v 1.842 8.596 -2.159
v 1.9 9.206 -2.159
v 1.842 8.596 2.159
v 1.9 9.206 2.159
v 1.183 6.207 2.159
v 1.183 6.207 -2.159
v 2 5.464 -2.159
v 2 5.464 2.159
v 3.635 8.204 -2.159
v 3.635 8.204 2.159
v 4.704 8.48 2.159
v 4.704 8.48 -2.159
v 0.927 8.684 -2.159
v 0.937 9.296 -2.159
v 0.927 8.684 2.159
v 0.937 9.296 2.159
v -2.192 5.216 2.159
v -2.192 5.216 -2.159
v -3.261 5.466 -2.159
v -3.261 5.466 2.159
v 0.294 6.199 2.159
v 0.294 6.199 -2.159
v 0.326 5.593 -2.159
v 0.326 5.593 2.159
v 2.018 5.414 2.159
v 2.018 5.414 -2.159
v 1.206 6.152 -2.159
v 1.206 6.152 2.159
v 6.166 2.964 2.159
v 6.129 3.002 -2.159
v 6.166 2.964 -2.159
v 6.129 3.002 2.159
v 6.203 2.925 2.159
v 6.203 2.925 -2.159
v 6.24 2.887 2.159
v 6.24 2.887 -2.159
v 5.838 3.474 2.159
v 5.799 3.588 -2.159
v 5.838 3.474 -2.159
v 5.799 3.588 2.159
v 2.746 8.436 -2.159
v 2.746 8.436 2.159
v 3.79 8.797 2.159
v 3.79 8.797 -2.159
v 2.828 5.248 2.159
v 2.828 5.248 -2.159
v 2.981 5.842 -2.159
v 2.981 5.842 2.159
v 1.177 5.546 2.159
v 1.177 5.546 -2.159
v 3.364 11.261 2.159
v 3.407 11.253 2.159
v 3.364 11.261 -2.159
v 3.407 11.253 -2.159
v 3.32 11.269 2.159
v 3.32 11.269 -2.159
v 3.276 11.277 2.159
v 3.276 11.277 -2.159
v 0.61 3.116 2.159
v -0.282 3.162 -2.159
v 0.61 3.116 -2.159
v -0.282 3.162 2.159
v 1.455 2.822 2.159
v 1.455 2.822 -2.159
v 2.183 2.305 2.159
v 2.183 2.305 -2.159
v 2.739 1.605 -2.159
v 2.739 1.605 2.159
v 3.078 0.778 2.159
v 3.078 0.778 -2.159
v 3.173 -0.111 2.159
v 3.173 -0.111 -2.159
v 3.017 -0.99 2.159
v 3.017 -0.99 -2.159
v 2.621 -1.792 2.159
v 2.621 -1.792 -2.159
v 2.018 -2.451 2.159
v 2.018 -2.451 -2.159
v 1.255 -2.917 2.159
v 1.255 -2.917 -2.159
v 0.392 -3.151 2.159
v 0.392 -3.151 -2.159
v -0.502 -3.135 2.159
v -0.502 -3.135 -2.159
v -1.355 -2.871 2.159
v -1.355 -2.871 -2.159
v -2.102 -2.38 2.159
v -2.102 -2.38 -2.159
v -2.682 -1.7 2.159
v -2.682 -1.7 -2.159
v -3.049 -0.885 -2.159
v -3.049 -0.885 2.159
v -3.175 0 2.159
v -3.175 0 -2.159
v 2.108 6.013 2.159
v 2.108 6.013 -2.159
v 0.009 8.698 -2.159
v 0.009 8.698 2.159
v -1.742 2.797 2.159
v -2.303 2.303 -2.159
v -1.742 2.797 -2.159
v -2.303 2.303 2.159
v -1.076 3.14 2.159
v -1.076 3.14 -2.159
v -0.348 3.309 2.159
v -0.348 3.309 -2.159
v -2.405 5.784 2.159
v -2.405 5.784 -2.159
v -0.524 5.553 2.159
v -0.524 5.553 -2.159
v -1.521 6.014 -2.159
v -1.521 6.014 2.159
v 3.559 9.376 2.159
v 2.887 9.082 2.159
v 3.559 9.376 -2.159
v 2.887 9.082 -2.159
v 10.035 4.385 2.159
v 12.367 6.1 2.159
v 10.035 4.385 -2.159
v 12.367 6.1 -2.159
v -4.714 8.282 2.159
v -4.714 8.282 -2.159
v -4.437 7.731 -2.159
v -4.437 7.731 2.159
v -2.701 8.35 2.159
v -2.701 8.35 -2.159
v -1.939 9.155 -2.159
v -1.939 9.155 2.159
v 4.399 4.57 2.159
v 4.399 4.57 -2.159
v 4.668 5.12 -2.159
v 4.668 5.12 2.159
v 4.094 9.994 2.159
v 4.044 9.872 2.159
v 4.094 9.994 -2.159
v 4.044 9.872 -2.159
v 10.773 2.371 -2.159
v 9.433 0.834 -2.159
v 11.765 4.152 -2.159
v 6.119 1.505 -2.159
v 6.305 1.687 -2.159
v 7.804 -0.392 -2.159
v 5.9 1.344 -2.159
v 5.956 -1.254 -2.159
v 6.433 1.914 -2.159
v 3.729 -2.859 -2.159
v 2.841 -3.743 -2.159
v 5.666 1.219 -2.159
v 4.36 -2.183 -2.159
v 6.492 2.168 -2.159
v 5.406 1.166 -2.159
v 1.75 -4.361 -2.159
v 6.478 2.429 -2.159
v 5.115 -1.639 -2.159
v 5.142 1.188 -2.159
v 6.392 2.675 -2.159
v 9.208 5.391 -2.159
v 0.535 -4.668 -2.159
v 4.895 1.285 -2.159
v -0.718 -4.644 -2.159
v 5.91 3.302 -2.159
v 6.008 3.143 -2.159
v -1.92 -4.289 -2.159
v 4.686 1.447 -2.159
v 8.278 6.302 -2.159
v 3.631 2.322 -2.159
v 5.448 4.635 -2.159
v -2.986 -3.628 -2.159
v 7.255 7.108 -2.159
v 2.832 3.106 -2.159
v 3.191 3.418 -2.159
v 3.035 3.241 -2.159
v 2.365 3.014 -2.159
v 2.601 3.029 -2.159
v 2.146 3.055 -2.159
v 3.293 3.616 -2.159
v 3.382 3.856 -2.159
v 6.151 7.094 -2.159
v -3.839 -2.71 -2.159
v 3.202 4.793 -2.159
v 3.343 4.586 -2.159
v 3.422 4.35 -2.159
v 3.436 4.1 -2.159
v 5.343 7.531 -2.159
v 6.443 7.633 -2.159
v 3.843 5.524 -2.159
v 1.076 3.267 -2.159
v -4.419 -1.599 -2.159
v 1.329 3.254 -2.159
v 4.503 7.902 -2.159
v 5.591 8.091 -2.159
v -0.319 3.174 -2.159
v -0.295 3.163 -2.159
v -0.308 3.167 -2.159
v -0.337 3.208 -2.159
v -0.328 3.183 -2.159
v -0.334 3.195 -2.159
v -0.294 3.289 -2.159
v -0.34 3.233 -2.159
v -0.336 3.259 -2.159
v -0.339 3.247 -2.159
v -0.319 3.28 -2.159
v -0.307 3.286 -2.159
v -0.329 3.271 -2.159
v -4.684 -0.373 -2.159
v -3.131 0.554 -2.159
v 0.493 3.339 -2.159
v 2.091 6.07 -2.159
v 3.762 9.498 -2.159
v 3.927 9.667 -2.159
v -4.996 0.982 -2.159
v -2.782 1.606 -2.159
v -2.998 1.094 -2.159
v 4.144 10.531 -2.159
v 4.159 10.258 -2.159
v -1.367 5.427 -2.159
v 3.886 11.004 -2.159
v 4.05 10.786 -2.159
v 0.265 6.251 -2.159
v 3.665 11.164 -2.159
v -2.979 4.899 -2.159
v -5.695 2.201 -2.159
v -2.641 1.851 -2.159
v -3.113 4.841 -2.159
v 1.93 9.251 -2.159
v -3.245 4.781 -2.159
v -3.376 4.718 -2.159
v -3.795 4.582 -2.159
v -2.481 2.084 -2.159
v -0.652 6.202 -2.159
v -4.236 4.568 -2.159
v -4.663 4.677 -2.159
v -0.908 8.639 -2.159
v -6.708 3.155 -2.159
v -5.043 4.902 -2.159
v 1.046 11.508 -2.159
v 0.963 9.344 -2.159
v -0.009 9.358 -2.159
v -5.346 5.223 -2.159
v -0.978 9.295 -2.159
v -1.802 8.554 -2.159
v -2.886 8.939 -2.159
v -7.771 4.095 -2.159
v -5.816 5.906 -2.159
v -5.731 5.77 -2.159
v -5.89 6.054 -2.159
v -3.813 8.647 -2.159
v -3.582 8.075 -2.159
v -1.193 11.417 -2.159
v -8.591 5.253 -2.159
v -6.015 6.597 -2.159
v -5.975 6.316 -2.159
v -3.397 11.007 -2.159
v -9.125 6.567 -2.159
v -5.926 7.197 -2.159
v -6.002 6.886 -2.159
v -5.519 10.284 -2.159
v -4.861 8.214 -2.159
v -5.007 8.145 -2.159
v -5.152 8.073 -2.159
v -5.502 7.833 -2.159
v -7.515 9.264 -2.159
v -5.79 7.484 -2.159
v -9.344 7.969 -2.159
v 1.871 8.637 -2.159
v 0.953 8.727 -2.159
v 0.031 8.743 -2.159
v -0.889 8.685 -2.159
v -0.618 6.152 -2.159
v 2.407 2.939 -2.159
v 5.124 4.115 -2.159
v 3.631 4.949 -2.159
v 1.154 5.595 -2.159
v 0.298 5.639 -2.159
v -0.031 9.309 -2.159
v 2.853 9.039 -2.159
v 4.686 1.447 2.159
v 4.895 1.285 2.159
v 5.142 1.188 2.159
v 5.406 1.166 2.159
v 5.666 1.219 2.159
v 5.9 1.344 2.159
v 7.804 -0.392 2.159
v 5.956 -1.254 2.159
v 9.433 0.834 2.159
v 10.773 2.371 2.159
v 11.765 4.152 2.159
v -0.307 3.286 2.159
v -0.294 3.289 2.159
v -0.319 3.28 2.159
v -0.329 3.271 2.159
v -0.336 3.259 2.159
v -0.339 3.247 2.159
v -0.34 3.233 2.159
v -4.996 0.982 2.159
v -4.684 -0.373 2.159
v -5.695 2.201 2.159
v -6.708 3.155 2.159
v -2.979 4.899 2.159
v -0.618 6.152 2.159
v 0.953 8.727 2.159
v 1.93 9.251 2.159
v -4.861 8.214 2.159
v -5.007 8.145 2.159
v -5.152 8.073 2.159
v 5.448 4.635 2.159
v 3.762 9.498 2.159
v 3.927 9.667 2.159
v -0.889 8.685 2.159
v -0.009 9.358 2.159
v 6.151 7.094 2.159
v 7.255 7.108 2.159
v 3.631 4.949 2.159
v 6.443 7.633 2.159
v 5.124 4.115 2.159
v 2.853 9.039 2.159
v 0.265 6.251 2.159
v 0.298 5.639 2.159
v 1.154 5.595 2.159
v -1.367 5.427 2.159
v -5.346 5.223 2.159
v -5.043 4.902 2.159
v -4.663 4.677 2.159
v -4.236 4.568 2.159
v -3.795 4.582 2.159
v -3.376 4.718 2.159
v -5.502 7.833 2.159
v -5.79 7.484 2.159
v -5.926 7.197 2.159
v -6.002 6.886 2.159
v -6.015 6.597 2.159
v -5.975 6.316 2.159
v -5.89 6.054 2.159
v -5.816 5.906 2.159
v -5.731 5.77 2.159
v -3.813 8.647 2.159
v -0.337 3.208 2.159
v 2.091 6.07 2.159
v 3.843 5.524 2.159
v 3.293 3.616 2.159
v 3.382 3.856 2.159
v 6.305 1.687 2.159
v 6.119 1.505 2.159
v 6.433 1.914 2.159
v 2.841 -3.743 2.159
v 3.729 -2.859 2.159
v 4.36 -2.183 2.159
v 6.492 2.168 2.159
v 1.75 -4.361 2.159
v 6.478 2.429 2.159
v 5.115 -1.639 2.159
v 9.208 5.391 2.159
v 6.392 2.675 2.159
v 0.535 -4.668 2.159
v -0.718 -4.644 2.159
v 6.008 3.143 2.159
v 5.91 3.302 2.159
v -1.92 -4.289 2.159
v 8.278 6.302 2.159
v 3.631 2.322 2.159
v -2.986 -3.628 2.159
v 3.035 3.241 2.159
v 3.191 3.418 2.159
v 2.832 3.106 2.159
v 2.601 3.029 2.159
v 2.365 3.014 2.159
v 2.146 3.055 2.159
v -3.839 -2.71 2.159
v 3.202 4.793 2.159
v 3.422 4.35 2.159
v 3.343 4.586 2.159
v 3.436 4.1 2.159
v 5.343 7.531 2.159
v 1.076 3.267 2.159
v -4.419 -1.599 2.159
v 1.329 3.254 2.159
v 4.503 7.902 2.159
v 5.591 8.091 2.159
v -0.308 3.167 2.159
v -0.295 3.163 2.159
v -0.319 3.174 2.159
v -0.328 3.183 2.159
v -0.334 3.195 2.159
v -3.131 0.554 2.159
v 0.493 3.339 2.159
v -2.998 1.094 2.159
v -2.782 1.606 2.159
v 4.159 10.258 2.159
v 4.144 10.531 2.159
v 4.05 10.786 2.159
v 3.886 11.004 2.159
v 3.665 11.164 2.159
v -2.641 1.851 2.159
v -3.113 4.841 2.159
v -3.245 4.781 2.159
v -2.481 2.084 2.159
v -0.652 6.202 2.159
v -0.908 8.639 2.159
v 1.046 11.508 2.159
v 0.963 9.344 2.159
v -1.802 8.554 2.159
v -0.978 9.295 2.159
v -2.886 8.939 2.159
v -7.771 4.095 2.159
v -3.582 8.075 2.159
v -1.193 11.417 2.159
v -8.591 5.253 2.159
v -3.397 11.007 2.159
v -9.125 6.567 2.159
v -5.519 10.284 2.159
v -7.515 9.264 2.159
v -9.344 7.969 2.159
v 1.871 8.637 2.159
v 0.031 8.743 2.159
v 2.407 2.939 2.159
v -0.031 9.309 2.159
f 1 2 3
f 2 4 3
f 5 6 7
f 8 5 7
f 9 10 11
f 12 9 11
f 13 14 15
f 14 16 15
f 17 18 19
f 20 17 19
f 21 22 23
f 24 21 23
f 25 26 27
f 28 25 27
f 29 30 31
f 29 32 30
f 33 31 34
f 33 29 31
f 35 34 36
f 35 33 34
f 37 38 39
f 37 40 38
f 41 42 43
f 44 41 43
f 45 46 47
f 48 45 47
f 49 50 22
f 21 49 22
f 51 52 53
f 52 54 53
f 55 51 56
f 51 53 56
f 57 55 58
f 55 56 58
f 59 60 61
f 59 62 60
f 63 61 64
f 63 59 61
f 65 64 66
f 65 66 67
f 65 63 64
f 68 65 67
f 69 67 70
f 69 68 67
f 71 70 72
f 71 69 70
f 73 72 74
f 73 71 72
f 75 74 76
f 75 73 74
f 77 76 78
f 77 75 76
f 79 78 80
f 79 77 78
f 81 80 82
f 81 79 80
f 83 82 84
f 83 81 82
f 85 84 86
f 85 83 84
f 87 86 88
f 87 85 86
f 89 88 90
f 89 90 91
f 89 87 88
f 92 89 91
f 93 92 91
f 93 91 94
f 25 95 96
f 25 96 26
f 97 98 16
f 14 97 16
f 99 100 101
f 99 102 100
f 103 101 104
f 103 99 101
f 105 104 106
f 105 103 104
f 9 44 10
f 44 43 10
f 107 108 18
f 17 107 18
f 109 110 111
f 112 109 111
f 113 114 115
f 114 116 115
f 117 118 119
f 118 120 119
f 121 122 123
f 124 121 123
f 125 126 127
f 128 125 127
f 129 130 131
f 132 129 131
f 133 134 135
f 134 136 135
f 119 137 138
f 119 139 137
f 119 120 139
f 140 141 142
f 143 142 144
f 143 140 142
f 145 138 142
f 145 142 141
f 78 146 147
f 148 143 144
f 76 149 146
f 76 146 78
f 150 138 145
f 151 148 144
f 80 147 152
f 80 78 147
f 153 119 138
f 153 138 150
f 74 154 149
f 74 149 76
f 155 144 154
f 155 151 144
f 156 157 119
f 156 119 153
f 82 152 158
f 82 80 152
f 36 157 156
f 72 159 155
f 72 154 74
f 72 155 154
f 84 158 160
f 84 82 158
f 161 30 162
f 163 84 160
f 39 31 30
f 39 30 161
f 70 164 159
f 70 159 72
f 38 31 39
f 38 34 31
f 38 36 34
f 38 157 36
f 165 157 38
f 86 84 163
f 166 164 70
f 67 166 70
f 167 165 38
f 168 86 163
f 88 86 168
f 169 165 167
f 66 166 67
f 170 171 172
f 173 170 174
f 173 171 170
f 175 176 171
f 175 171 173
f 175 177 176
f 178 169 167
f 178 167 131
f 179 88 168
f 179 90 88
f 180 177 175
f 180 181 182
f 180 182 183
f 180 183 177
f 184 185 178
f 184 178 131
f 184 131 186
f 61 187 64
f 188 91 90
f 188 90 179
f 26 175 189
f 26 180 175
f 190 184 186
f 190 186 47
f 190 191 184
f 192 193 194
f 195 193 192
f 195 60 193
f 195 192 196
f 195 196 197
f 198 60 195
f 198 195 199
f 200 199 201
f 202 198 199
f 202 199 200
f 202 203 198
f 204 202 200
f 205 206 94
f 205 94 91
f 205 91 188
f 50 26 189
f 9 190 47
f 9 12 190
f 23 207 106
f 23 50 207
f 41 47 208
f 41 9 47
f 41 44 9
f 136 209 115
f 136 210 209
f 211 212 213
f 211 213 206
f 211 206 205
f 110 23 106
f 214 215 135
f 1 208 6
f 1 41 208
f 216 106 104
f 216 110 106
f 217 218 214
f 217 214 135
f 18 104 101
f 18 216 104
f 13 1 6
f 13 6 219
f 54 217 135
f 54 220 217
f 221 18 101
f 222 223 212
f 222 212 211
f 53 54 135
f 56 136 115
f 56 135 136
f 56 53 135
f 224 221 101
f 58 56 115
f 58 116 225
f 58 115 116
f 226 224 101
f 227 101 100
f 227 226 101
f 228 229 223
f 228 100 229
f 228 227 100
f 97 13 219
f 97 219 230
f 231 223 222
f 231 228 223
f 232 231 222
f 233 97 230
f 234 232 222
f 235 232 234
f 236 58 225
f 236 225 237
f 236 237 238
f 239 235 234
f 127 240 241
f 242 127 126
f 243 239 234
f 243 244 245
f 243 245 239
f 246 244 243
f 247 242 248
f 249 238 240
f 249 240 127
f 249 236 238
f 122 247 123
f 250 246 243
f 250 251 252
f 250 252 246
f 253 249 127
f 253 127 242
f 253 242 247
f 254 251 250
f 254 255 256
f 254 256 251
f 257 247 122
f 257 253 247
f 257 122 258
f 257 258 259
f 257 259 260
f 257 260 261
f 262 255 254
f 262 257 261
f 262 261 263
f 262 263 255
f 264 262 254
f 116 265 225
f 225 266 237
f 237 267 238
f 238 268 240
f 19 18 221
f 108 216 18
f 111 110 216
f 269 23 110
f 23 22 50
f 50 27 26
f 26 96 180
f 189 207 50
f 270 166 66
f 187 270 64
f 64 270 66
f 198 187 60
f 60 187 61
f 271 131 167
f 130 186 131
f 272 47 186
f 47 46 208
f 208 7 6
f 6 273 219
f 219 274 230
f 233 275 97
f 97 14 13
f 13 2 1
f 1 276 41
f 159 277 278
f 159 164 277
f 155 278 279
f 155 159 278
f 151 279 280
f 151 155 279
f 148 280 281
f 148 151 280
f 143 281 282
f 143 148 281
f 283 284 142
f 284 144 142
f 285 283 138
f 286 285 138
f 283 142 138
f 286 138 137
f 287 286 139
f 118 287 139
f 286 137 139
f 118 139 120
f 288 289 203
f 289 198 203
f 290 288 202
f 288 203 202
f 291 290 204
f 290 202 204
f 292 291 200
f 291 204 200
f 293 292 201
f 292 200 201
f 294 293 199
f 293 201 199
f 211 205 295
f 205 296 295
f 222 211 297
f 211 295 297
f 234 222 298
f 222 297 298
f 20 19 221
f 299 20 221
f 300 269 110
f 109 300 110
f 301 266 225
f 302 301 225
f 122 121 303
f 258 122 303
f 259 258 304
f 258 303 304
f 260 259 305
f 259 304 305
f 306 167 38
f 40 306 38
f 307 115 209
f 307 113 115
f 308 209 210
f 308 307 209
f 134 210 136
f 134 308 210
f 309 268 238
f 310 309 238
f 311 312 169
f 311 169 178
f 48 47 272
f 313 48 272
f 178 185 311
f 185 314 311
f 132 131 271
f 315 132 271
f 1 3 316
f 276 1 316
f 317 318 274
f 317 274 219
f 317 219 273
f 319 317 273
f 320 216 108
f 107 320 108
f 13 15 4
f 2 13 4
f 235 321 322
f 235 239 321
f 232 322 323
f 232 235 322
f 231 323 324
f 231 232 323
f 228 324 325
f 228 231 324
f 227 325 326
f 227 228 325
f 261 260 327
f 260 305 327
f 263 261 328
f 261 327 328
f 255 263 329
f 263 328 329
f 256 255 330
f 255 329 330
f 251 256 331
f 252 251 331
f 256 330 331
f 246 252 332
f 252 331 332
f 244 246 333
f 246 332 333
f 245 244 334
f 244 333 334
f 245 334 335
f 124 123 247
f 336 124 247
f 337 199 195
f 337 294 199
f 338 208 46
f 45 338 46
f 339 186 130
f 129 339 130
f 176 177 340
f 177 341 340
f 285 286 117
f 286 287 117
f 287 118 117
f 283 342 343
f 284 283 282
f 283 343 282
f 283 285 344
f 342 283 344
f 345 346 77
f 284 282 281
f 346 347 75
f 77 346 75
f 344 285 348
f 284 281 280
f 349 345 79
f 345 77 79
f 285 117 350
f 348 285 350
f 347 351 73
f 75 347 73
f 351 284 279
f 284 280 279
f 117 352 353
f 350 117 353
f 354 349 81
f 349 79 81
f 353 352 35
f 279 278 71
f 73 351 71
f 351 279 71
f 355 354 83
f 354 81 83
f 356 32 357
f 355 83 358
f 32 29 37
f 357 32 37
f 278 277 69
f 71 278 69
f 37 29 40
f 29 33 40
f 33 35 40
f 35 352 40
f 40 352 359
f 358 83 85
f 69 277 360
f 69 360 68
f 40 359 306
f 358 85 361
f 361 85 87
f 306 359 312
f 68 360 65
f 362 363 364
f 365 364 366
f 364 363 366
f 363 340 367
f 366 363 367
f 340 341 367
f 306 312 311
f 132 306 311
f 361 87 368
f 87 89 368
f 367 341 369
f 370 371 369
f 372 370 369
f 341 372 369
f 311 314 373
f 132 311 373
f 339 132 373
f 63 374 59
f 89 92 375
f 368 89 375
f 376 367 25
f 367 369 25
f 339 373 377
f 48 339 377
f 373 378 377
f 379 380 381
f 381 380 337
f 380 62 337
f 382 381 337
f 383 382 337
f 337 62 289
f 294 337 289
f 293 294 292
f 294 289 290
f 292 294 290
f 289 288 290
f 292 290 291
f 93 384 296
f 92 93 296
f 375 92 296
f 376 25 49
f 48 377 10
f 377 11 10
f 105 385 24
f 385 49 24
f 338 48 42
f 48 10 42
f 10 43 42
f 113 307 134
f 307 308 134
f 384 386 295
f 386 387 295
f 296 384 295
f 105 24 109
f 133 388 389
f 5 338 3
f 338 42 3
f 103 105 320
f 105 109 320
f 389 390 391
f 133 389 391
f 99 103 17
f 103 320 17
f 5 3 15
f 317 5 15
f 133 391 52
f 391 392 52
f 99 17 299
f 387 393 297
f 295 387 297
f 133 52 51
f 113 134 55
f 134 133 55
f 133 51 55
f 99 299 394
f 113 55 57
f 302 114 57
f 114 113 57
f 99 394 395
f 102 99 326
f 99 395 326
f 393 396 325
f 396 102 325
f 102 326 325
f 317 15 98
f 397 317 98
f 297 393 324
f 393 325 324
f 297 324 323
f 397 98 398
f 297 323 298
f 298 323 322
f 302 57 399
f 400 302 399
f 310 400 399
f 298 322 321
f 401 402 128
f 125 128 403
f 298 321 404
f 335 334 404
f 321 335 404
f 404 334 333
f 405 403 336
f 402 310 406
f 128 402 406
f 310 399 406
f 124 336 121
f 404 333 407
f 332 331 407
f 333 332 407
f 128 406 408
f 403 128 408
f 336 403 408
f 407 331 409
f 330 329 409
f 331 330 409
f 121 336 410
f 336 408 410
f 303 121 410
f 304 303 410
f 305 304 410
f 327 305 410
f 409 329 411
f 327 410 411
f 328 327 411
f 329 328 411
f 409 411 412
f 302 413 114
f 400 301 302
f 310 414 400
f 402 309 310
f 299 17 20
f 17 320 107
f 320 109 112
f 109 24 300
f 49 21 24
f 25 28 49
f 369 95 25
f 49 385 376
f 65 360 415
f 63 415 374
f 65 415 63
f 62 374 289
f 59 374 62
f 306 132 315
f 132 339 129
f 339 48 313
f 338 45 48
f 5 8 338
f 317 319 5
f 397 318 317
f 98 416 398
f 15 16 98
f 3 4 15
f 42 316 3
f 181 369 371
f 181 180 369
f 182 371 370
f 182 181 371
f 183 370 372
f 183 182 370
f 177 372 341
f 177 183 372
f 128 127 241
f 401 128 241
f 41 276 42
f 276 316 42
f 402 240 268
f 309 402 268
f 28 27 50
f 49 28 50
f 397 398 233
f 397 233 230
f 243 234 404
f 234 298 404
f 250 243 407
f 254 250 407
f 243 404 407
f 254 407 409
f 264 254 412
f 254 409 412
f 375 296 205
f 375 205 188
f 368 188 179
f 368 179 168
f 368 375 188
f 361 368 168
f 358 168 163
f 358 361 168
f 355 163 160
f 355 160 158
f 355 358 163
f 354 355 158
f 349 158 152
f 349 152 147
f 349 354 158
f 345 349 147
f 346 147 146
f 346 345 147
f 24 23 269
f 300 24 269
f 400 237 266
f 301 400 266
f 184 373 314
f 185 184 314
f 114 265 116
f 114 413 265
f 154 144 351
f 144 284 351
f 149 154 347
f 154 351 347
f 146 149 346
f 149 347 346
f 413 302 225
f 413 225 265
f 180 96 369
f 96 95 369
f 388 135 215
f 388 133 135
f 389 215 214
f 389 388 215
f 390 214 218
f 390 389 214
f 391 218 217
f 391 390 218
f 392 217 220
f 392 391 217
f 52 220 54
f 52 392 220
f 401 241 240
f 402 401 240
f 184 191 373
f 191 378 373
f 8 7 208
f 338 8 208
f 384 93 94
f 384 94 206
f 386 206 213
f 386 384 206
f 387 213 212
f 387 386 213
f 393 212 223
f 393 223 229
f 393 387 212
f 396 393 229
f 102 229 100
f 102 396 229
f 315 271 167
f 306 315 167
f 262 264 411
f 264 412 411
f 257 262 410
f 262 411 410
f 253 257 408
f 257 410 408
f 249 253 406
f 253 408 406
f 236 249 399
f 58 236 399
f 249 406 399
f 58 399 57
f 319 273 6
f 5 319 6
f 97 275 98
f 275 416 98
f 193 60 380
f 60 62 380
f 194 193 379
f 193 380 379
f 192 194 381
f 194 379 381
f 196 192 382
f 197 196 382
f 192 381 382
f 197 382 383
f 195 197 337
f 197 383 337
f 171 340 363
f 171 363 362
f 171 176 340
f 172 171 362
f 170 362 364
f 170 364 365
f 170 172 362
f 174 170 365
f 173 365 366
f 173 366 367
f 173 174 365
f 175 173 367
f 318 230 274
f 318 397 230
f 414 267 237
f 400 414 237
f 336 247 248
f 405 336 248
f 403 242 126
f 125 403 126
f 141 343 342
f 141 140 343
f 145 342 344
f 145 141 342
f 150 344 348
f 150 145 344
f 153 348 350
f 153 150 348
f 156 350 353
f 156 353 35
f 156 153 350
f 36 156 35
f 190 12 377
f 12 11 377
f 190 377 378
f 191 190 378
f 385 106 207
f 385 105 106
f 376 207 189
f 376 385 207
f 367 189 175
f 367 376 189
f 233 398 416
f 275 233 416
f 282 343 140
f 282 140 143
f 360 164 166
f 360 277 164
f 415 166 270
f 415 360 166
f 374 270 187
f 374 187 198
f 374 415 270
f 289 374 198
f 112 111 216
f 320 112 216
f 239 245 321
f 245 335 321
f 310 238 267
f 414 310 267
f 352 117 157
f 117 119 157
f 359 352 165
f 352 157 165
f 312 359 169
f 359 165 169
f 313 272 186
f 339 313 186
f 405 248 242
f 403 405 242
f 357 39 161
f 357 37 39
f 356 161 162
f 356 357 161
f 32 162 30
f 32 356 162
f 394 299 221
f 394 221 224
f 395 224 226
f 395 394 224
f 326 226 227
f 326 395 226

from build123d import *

# Parameters (mm, degrees)
BOSS_EXTRUDE1_DEPTH  = 2.159
BOSS_EXTRUDE2_DEPTH  = 2.159
CRVPATTERN14_START   = -2.159
CRVPATTERN14_DEPTH   = 4.318
BOSS_EXTRUDE3_DEPTH  = 2.159
BOSS_EXTRUDE12_START = -2.159
BOSS_EXTRUDE12_DEPTH = 4.318
BOSS_EXTRUDE4_DEPTH  = 2.159
CRVPATTERN15_START   = -2.159
CRVPATTERN15_DEPTH   = 4.318
BOSS_EXTRUDE6_DEPTH  = 2.159
BOSS_EXTRUDE8_DEPTH  = 2.159
FILLET6_R            = 1.2252325
BOSS_EXTRUDE7_DEPTH  = 2.159
CRVPATTERN16_COUNT   = 8
CRVPATTERN16_ANGLE   = 32.099318005
BOSS_EXTRUDE9_DEPTH  = 2.159
BOSS_EXTRUDE10_DEPTH = 2.159
CRVPATTERN17_START   = -2.159
CRVPATTERN17_DEPTH   = 4.318
FILLET7_R            = 1.56731187
BOSS_EXTRUDE11_DEPTH = 2.159
FILLET5_R            = 0.924207216
FILLET4_R            = 0.0508
FILLET8_R            = 4.7625


# Read off the part's stored shape, not the designer's step: CrvPattern14, CrvPattern15, CrvPattern17
with BuildPart() as part:
    # Sketch2 → Boss-Extrude1 (new, symmetric)
    with BuildSketch(Plane.XY):
        with BuildLine():
            Line((-0.345152986, 3.283911299), (-0.331877871, 3.157607018))
            ThreePointArc((-0.331877871, 3.157607018), (2.359484821, -2.124489675), (-3.175, 0))
            ThreePointArc((-3.175, 0), (-3.075214252, 0.826718033), (-2.78158852, 1.605950881))
            Line((-2.78158852, 1.605950881), (-4.069453372, 2.3495))
            ThreePointArc((-4.069453372, 2.3495), (-2.00731761, -4.248679443), (4.399194849, -1.65157067))
            Line((4.399194849, -1.65157067), (10.362922249, 2.734275533))
            ThreePointArc((10.362922249, 2.734275533), (9.973832009, 3.391907291), (9.541861687, 4.022202765))
            ThreePointArc((9.541861687, 4.022202765), (4.931855371, 7.722304078), (-0.907951479, 8.638581279))
            Line((-0.907951479, 8.638581279), (-0.651808138, 6.201540183))
            ThreePointArc((-0.651808138, 6.201540183), (3.941642024, 5.480818802), (7.56776097, 2.57040902))
            Line((7.56776097, 2.57040902), (5.204364932, 0.832319593))
            ThreePointArc((5.204364932, 0.832319593), (2.756157271, 2.797309609), (-0.345152986, 3.283911299))
        make_face()
    extrude(amount=BOSS_EXTRUDE1_DEPTH, both=True)

    # Sketch3 → Boss-Extrude2 (add, symmetric)
    with BuildSketch(Plane.XY):
        Polygon((-0.651808138, 6.201540183), (0.298358904, 5.639245785), (0.265388682, 6.250974184), (-0.392244602, 6.640151555), align=None)
    extrude(amount=BOSS_EXTRUDE2_DEPTH, both=True)

    # CrvPattern14 outline → CrvPattern14 (add)
    with BuildSketch(Plane.XY.offset(CRVPATTERN14_START)):
        with BuildLine():
            ThreePointArc((6.174117189, 4.072966487), (5.818003264, 4.363212667), (5.447590186, 4.634973821))
            Line((5.447590186, 4.634973821), (5.799283959, 3.588406151))
            Line((5.799283959, 3.588406151), (6.174117189, 4.072966487))
        make_face()
        with BuildLine():
            ThreePointArc((5.447590186, 4.634973821), (5.063836478, 4.88754671), (4.667735183, 5.120277749))
            Line((4.667735183, 5.120277749), (5.123914626, 4.114846143))
            Line((5.123914626, 4.114846143), (5.447590186, 4.634973821))
        make_face()
        with BuildLine():
            ThreePointArc((4.667735183, 5.120277749), (4.260311296, 5.332564697), (3.842619111, 5.523858218))
            Line((3.842619111, 5.523858218), (4.398565438, 4.569963004))
            Line((4.398565438, 4.569963004), (4.667735183, 5.120277749))
        make_face()
        with BuildLine():
            ThreePointArc((3.842619111, 5.523858218), (3.415739494, 5.693663299), (2.980777087, 5.841540535))
            Line((2.980777087, 5.841540535), (3.630739511, 4.949048941))
            Line((3.630739511, 4.949048941), (3.842619111, 5.523858218))
        make_face()
        with BuildLine():
            ThreePointArc((2.980777087, 5.841540535), (2.538857445, 5.967107261), (2.091124129, 6.070038548))
            Line((2.091124129, 6.070038548), (2.828379346, 5.248182634))
            Line((2.828379346, 5.248182634), (2.980777087, 5.841540535))
        make_face()
        with BuildLine():
            ThreePointArc((2.091124129, 6.070038548), (1.638735742, 6.150068039), (1.182862933, 6.206988641))
            Line((1.182862933, 6.206988641), (1.99978467, 5.464269802))
            Line((1.99978467, 5.464269802), (2.091124129, 6.070038548))
        make_face()
        with BuildLine():
            Line((0.265388682, 6.250974184), (1.153526584, 5.595075209))
            Line((1.153526584, 5.595075209), (1.182862933, 6.206988641))
            ThreePointArc((1.182862933, 6.206988641), (0.72468537, 6.240653061), (0.265388682, 6.250974184))
        make_face()
    extrude(amount=CRVPATTERN14_DEPTH)

    # Sketch6 → Boss-Extrude3 (add, symmetric)
    with BuildSketch(Plane.XY):
        with BuildLine():
            Line((-5.795109436, 2.930998085), (-4.193189288, 2.120793388))
            Line((-4.193189288, 2.120793388), (-2.78158852, 1.605950881))
            ThreePointArc((-2.78158852, 1.605950881), (-2.563325524, 1.968866129), (-2.302532257, 2.302532257))
            ThreePointArc((-2.302532257, 2.302532257), (-1.419579718, 2.989179637), (-0.347808009, 3.309172155))
            ThreePointArc((-0.347808009, 3.309172155), (0.982394739, 3.303690003), (2.280021634, 3.011057396))
            Line((2.280021634, 3.011057396), (2.834587117, 5.170248259))
            ThreePointArc((2.834587117, 5.170248259), (1.69609872, 5.447948005), (0.529939284, 5.563469196))
            ThreePointArc((0.529939284, 5.563469196), (-2.556537552, 5.065687863), (-5.243376004, 3.467243416))
            ThreePointArc((-5.243376004, 3.467243416), (-5.525424614, 3.205481193), (-5.795109436, 2.930998085))
        make_face()
    extrude(amount=BOSS_EXTRUDE3_DEPTH, both=True)

    # Sketch24 → Boss-Extrude12 (add)
    with BuildSketch(Plane.XY.offset(BOSS_EXTRUDE12_START)):
        with BuildLine():
            Line((-4.220330333, 2.13452054), (-2.859660878, 1.446333438))
            ThreePointArc((-2.859660878, 1.446333438), (-3.095249982, 0.74015525), (-3.175, 0))
            Line((-3.175, 0), (-4.699, 0))
            ThreePointArc((-4.699, 0), (-4.577864782, 1.093766724), (-4.220330333, 2.13452054))
        make_face()
    extrude(amount=BOSS_EXTRUDE12_DEPTH)

    # Sketch7 → Boss-Extrude4 (add, symmetric)
    with BuildSketch(Plane.XY):
        Polygon((2.841171549, 5.195884629), (2.108204785, 6.012959986), (2.013876484, 5.387369061), (1.956921428, 5.009639728), (2.76215236, 4.888224818), align=None)
    extrude(amount=BOSS_EXTRUDE4_DEPTH, both=True)

    # CrvPattern15 outline → CrvPattern15 (add)
    with BuildSketch(Plane.XY.offset(CRVPATTERN15_START)):
        with BuildLine():
            Line((-3.260742946, 5.465648477), (-2.97939475, 4.898987179))
            ThreePointArc((-2.97939475, 4.898987179), (-0.520320905, 5.527213901), (2.013876484, 5.387369061))
            Line((2.013876484, 5.387369061), (2.017822858, 5.413541649))
            Line((2.017822858, 5.413541649), (1.205652977, 6.151940254))
            Line((1.205652977, 6.151940254), (1.176624168, 5.546441646))
            Line((1.176624168, 5.546441646), (0.293652371, 6.1985254))
            Line((0.293652371, 6.1985254), (0.326276958, 5.593209885))
            Line((0.326276958, 5.593209885), (-0.61836317, 6.152233539))
            Line((-0.61836317, 6.152233539), (-0.524422659, 5.553362588))
            Line((-0.524422659, 5.553362588), (-1.520959625, 6.013543523))
            Line((-1.520959625, 6.013543523), (-1.366674925, 5.427311941))
            Line((-1.366674925, 5.427311941), (-2.404800409, 5.783889979))
            Line((-2.404800409, 5.783889979), (-2.191767463, 5.21636183))
            Line((-2.191767463, 5.21636183), (-3.260742946, 5.465648477))
        make_face()
    extrude(amount=CRVPATTERN15_DEPTH)

    # Sketch15 → Boss-Extrude6 (add, symmetric)
    with BuildSketch(Plane.XY):
        with BuildLine():
            Line((6.174117189, 4.072966487), (5.799283959, 3.588406151))
            Line((5.799283959, 3.588406151), (5.931866036, 3.193869408))
            ThreePointArc((5.931866036, 3.193869408), (6.446193236, 2.662565202), (6.910663393, 2.087166122))
            Line((6.910663393, 2.087166122), (7.56776097, 2.57040902))
            ThreePointArc((7.56776097, 2.57040902), (6.91369744, 3.361346752), (6.174117189, 4.072966487))
        make_face()
    extrude(amount=BOSS_EXTRUDE6_DEPTH, both=True)

    # Sketch20 → Boss-Extrude8 (add, symmetric)
    with BuildSketch(Plane.XY):
        with BuildLine():
            Line((2.841171549, 5.195884629), (3.574138313, 4.378809272))
            Line((3.574138313, 4.378809272), (2.9657089, 2.728197927))
            ThreePointArc((2.9657089, 2.728197927), (2.627152469, 2.880020383), (2.280021634, 3.011057396))
            Line((2.280021634, 3.011057396), (2.841171549, 5.195884629))
        make_face()
    extrude(amount=BOSS_EXTRUDE8_DEPTH, both=True)

    # Fillet6
    fillet6_edges = [part.edges().sort_by_distance(p)[0] for p in [
        (5.931866036, 3.193869408, 0),
    ]]
    fillet(fillet6_edges, radius=FILLET6_R)

    # Sketch16 → Boss-Extrude7 (add, symmetric)
    with BuildSketch(Plane.XY):
        Polygon((-0.907951479, 8.638581279), (-0.03080494, 9.30931519), (0.008805334, 8.697980833), (-0.59835021, 8.233702866), align=None)
    boss_extrude7 = extrude(amount=BOSS_EXTRUDE7_DEPTH, both=True)

    # CrvPattern16: Boss-Extrude7 ×8 about axis
    crvpattern16_axis = Axis((0.292208676, -2.780179842, 0), (0, 0, -1))
    for i in range(1, CRVPATTERN16_COUNT):
        add(boss_extrude7.rotate(crvpattern16_axis, i * CRVPATTERN16_ANGLE / (CRVPATTERN16_COUNT - 1)))

    # Sketch21 → Boss-Extrude9 (add, symmetric)
    with BuildSketch(Plane.XY):
        with BuildLine():
            Line((-6.320027167, 6.606343854), (-4.514811412, 4.043715892))
            ThreePointArc((-4.514811412, 4.043715892), (-5.183299194, 3.519963702), (-5.795109436, 2.930998085))
            Line((-5.795109436, 2.930998085), (-9.344214544, 7.969196961))
            ThreePointArc((-9.344214544, 7.969196961), (-3.396900447, 11.006572804), (3.275672454, 11.276698424))
            Line((3.275672454, 11.276698424), (2.886661012, 9.081631647))
            ThreePointArc((2.886661012, 9.081631647), (0.963406298, 9.34348497), (-0.976999989, 9.295533971))
            ThreePointArc((-0.976999989, 9.295533971), (-3.976201015, 8.587072836), (-6.700447257, 7.146376345))
            Line((-6.700447257, 7.146376345), (-6.320027167, 6.606343854))
        make_face()
    extrude(amount=BOSS_EXTRUDE9_DEPTH, both=True)

    # Sketch22 → Boss-Extrude10 (add, symmetric)
    with BuildSketch(Plane.XY):
        Polygon((2.886661012, 9.081631647), (2.670487492, 9.575318036), (1.930019742, 9.251084831), (1.871281039, 8.637020922), align=None)
    extrude(amount=BOSS_EXTRUDE10_DEPTH, both=True)

    # CrvPattern17 outline → CrvPattern17 (add)
    with BuildSketch(Plane.XY.offset(CRVPATTERN17_START)):
        with BuildLine():
            Line((-4.437083666, 7.73075431), (-3.813187634, 8.646957851))
            ThreePointArc((-3.813187634, 8.646957851), (-4.26705933, 8.473567533), (-4.713630949, 8.282158264))
            Line((-4.713630949, 8.282158264), (-4.437083666, 7.73075431))
        make_face()
        with BuildLine():
            Line((-3.581609613, 8.075209357), (-2.886461405, 8.938600437))
            ThreePointArc((-2.886461405, 8.938600437), (-3.352742578, 8.802051596), (-3.813187634, 8.646957851))
            Line((-3.813187634, 8.646957851), (-3.581609613, 8.075209357))
        make_face()
        with BuildLine():
            Line((-2.701335217, 8.350167761), (-1.939385201, 9.155218915))
            ThreePointArc((-1.939385201, 9.155218915), (-2.415090701, 9.056385741), (-2.886461405, 8.938600437))
            Line((-2.886461405, 8.938600437), (-2.701335217, 8.350167761))
        make_face()
        with BuildLine():
            Line((-1.801896032, 8.553869226), (-0.978022242, 9.295426484))
            ThreePointArc((-0.978022242, 9.295426484), (-1.460106582, 9.234941712), (-1.939385201, 9.155218915))
            Line((-1.939385201, 9.155218915), (-1.801896032, 8.553869226))
        make_face()
        with BuildLine():
            Line((-0.889050303, 8.685009647), (-0.008527213, 9.358325529))
            ThreePointArc((-0.008527213, 9.358325529), (-0.49390407, 9.336576385), (-0.978022242, 9.295426484))
            Line((-0.978022242, 9.295426484), (-0.889050303, 8.685009647))
        make_face()
        with BuildLine():
            Line((0.031357894, 8.742749459), (0.962893139, 9.343513369))
            ThreePointArc((0.962893139, 9.343513369), (0.477331168, 9.360639092), (-0.008527213, 9.358325529))
            Line((-0.008527213, 9.358325529), (0.031357894, 8.742749459))
        make_face()
        with BuildLine():
            Line((0.953436069, 8.726719008), (1.930019742, 9.251084831))
            ThreePointArc((1.930019742, 9.251084831), (1.447381243, 9.306975781), (0.962893139, 9.343513369))
            Line((0.962893139, 9.343513369), (0.953436069, 8.726719008))
        make_face()
    extrude(amount=CRVPATTERN17_DEPTH)

    # Fillet7
    fillet7_edges = [part.edges().sort_by_distance(p)[0] for p in [
        (-4.514811412, 4.043715892, 0),
        (-6.700447257, 7.146376345, 0),
    ]]
    fillet(fillet7_edges, radius=FILLET7_R)

    # Sketch23 → Boss-Extrude11 (add, symmetric)
    with BuildSketch(Plane.XY):
        with BuildLine():
            Line((10.362922249, 2.734275533), (4.399194849, -1.65157067))
            ThreePointArc((4.399194849, -1.65157067), (9.590201078, 0.983655797), (12.367362142, 6.100133162))
            Line((12.367362142, 6.100133162), (10.035011768, 4.384875346))
            ThreePointArc((10.035011768, 4.384875346), (8.755476597, 5.858878211), (7.255483957, 7.107844495))
            Line((7.255483957, 7.107844495), (6.151492239, 7.093891561))
            ThreePointArc((6.151492239, 7.093891561), (8.550099761, 5.197020468), (10.362922249, 2.734275533))
        make_face()
        with BuildLine():
            Line((2.886661012, 9.081631647), (3.902040986, 9.526242372))
            Line((3.902040986, 9.526242372), (4.508317815, 11.00637547))
            ThreePointArc((4.508317815, 11.00637547), (3.894731572, 11.154014824), (3.275672454, 11.276698424))
            Line((3.275672454, 11.276698424), (2.886661012, 9.081631647))
        make_face()
        with BuildLine():
            Line((-9.344214544, 7.969196961), (-5.795109436, 2.930998085))
            Line((-5.795109436, 2.930998085), (-4.220330333, 2.13452054))
            ThreePointArc((-4.220330333, 2.13452054), (-7.815223836, 4.144743604), (-9.344214544, 7.969196961))
        make_face()
    extrude(amount=BOSS_EXTRUDE11_DEPTH, both=True)

    # Fillet5
    fillet5_edges = [part.edges().sort_by_distance(p)[0] for p in [
        (5.204364932, 0.832319593, 0),
        (6.910663393, 2.087166122, 0),
        (2.9657089, 2.728197927, 0),
        (3.574138313, 4.378809272, 0),
        (4.508317815, 11.00637547, 0),
        (3.902040986, 9.526242372, 0),
    ]]
    fillet(fillet5_edges, radius=FILLET5_R)

    # Fillet4
    fillet4_edges = [part.edges().sort_by_distance(p)[0] for p in [
        (-0.331877871, 3.157607018, 0),
        (-0.345152986, 3.283911299, 0),
    ]]
    fillet(fillet4_edges, radius=FILLET4_R)

    # Fillet8
    fillet8_edges = [part.edges().sort_by_distance(p)[0] for p in [
        (4.399194849, -1.65157067, 0),
        (-4.220330333, 2.13452054, 0),
    ]]
    fillet(fillet8_edges, radius=FILLET8_R)


solid = part.part
